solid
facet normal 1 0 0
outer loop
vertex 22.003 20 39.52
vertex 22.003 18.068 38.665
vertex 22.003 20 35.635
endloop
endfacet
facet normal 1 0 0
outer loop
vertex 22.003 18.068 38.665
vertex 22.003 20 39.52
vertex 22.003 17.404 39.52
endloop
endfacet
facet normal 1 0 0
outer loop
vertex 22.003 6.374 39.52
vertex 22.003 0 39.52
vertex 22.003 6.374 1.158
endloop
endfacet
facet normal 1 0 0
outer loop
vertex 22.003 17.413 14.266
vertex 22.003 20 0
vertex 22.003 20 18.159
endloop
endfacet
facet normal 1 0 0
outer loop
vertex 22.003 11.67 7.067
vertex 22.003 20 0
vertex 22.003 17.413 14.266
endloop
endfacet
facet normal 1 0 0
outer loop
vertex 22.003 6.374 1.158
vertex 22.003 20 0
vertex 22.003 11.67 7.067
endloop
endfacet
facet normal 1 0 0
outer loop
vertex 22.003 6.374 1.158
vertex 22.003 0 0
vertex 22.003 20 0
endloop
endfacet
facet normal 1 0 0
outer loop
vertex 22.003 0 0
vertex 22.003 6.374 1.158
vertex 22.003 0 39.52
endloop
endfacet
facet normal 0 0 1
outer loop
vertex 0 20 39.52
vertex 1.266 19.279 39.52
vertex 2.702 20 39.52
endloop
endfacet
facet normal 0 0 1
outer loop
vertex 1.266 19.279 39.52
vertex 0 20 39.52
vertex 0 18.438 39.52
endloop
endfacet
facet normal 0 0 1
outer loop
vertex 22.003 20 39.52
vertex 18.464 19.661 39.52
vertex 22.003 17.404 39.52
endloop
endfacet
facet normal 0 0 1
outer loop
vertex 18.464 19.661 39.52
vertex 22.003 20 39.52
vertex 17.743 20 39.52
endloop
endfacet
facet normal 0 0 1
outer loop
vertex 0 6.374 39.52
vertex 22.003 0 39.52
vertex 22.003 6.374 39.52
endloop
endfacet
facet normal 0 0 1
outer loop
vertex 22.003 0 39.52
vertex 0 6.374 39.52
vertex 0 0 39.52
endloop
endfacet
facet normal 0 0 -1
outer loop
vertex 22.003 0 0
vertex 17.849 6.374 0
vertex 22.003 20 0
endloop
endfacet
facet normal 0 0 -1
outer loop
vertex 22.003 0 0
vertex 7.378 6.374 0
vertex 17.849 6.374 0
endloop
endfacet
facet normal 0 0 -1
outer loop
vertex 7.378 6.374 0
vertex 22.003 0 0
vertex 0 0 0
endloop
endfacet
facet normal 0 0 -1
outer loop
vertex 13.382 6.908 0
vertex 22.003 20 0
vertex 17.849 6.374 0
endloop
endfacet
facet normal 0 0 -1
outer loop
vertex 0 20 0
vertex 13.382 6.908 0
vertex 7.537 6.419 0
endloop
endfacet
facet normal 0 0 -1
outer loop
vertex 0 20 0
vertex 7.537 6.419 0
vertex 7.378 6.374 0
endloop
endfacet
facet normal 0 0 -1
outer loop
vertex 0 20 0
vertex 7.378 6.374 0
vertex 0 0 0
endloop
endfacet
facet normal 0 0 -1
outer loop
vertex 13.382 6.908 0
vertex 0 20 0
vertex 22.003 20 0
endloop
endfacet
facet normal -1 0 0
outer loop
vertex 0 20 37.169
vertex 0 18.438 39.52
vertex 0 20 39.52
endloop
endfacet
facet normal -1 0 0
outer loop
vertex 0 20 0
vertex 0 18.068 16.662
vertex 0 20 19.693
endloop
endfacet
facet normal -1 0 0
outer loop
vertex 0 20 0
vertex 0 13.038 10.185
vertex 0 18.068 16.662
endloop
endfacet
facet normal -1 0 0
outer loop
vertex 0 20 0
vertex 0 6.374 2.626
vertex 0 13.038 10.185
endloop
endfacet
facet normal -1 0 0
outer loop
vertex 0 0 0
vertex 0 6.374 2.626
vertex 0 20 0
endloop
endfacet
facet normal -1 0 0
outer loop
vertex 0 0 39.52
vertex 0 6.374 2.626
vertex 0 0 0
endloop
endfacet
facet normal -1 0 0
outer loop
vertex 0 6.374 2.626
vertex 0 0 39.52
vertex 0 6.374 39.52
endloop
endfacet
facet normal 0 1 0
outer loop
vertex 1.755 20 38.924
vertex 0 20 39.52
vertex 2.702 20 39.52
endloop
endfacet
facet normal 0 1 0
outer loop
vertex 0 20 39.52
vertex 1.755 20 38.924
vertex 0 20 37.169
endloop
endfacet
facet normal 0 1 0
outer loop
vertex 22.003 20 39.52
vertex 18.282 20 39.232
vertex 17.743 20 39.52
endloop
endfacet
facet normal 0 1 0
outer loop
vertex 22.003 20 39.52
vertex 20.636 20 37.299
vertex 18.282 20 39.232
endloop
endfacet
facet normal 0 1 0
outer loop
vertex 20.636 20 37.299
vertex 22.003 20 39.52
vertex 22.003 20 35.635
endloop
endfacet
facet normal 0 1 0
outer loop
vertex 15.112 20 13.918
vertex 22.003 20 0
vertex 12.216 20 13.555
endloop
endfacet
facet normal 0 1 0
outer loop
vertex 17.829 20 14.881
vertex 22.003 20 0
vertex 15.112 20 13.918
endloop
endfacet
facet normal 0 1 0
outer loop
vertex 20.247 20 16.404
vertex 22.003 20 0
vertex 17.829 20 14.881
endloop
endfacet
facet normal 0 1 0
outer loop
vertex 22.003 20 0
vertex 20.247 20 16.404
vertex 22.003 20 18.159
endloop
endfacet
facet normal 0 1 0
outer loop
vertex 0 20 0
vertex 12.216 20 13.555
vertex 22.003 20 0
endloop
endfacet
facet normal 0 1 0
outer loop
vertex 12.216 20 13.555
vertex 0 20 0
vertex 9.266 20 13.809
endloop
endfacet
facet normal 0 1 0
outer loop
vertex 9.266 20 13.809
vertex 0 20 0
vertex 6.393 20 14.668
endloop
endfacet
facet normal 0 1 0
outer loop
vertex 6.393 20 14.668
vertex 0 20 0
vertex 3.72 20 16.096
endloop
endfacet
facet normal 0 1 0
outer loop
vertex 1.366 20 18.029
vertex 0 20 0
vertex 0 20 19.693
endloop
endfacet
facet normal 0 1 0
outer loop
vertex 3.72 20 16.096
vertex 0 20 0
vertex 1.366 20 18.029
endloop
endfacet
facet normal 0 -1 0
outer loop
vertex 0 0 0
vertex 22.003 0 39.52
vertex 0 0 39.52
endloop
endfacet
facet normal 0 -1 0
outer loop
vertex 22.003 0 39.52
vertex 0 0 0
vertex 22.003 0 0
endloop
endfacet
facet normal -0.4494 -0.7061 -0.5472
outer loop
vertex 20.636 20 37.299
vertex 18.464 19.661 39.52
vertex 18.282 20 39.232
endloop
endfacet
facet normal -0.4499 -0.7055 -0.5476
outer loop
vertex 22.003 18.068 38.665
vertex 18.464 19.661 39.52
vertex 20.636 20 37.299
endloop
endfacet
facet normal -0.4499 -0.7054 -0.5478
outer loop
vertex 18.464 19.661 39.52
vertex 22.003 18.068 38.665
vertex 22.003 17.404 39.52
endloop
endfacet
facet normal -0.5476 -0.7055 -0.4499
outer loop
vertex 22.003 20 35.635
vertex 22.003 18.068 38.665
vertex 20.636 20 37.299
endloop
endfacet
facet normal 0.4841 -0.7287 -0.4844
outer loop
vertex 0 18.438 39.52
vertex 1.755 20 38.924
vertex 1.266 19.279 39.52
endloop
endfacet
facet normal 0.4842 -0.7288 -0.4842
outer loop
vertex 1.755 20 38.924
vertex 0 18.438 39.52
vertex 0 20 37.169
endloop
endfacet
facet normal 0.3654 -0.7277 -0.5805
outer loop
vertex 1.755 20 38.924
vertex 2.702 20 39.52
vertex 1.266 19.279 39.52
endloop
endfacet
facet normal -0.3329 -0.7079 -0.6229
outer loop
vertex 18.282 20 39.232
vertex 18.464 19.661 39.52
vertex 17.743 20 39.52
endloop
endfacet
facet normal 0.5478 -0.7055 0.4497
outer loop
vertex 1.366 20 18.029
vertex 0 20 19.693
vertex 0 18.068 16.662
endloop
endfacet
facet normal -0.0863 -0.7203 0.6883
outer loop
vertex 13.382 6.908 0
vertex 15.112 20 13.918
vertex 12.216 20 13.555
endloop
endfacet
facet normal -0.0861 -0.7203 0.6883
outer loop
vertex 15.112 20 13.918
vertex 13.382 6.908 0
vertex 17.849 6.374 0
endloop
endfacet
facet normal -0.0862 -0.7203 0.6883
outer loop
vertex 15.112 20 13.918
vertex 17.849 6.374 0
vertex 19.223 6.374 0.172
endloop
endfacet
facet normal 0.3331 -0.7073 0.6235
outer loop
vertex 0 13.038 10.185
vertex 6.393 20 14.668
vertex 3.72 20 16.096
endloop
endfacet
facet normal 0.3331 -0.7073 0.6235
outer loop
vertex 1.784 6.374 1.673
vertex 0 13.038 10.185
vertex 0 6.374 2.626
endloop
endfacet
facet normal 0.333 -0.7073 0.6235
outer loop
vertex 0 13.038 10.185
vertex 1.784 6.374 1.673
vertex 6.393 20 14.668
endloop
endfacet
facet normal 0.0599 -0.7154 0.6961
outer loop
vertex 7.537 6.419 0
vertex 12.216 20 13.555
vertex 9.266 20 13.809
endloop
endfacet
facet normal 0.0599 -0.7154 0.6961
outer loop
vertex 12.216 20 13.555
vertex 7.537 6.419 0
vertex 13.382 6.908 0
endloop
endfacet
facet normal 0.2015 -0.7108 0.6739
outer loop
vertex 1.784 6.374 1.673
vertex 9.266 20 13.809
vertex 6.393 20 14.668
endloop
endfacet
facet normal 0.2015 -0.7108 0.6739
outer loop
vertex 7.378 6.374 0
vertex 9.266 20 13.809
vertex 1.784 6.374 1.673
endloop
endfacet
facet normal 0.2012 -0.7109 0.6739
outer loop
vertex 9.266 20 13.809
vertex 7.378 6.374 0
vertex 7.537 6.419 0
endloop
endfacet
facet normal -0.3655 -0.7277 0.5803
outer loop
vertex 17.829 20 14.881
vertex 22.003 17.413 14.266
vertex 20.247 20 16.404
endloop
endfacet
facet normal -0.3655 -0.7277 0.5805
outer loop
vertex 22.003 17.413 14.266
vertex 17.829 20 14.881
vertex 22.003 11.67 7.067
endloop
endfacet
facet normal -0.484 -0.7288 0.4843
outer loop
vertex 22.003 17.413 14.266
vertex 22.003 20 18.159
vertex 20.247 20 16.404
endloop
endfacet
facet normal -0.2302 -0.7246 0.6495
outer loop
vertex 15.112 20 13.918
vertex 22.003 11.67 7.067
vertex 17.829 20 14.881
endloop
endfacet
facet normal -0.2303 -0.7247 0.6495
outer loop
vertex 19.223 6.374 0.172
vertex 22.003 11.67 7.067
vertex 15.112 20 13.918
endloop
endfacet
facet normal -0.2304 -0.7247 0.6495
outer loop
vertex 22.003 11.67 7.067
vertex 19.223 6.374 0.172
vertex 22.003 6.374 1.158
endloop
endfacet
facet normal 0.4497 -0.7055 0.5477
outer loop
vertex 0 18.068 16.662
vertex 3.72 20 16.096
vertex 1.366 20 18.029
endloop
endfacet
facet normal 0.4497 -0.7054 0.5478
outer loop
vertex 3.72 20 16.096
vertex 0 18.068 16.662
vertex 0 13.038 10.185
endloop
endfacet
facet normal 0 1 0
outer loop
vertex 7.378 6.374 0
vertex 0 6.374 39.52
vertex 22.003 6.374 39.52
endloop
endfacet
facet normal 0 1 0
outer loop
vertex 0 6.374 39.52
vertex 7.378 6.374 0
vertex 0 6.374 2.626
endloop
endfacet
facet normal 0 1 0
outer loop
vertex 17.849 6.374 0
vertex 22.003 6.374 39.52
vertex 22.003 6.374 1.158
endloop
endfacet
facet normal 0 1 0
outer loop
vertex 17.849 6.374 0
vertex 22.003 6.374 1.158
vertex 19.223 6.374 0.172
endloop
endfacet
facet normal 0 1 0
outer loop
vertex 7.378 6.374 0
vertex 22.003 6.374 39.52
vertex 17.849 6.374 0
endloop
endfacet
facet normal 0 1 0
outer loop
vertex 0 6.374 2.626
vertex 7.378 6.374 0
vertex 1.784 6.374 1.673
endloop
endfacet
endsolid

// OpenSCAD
// v_groove finger  params={"finger_length": 39.51974323486036, "groove_angle": 93.89238394711238, "groove_depth": 13.62609403519981, "pad_width": 22.00279076040616}
difference(){cube([22.00279076040616,20,39.51974323486036]); translate([11.00139538020308,20,27.663820264402247]) rotate([90,0,0]) rotate([0,0,45]) scale([1,1.070,1]) cylinder(h=27.25218807039962,r1=0,r2=27.25218807039962,center=true);}
